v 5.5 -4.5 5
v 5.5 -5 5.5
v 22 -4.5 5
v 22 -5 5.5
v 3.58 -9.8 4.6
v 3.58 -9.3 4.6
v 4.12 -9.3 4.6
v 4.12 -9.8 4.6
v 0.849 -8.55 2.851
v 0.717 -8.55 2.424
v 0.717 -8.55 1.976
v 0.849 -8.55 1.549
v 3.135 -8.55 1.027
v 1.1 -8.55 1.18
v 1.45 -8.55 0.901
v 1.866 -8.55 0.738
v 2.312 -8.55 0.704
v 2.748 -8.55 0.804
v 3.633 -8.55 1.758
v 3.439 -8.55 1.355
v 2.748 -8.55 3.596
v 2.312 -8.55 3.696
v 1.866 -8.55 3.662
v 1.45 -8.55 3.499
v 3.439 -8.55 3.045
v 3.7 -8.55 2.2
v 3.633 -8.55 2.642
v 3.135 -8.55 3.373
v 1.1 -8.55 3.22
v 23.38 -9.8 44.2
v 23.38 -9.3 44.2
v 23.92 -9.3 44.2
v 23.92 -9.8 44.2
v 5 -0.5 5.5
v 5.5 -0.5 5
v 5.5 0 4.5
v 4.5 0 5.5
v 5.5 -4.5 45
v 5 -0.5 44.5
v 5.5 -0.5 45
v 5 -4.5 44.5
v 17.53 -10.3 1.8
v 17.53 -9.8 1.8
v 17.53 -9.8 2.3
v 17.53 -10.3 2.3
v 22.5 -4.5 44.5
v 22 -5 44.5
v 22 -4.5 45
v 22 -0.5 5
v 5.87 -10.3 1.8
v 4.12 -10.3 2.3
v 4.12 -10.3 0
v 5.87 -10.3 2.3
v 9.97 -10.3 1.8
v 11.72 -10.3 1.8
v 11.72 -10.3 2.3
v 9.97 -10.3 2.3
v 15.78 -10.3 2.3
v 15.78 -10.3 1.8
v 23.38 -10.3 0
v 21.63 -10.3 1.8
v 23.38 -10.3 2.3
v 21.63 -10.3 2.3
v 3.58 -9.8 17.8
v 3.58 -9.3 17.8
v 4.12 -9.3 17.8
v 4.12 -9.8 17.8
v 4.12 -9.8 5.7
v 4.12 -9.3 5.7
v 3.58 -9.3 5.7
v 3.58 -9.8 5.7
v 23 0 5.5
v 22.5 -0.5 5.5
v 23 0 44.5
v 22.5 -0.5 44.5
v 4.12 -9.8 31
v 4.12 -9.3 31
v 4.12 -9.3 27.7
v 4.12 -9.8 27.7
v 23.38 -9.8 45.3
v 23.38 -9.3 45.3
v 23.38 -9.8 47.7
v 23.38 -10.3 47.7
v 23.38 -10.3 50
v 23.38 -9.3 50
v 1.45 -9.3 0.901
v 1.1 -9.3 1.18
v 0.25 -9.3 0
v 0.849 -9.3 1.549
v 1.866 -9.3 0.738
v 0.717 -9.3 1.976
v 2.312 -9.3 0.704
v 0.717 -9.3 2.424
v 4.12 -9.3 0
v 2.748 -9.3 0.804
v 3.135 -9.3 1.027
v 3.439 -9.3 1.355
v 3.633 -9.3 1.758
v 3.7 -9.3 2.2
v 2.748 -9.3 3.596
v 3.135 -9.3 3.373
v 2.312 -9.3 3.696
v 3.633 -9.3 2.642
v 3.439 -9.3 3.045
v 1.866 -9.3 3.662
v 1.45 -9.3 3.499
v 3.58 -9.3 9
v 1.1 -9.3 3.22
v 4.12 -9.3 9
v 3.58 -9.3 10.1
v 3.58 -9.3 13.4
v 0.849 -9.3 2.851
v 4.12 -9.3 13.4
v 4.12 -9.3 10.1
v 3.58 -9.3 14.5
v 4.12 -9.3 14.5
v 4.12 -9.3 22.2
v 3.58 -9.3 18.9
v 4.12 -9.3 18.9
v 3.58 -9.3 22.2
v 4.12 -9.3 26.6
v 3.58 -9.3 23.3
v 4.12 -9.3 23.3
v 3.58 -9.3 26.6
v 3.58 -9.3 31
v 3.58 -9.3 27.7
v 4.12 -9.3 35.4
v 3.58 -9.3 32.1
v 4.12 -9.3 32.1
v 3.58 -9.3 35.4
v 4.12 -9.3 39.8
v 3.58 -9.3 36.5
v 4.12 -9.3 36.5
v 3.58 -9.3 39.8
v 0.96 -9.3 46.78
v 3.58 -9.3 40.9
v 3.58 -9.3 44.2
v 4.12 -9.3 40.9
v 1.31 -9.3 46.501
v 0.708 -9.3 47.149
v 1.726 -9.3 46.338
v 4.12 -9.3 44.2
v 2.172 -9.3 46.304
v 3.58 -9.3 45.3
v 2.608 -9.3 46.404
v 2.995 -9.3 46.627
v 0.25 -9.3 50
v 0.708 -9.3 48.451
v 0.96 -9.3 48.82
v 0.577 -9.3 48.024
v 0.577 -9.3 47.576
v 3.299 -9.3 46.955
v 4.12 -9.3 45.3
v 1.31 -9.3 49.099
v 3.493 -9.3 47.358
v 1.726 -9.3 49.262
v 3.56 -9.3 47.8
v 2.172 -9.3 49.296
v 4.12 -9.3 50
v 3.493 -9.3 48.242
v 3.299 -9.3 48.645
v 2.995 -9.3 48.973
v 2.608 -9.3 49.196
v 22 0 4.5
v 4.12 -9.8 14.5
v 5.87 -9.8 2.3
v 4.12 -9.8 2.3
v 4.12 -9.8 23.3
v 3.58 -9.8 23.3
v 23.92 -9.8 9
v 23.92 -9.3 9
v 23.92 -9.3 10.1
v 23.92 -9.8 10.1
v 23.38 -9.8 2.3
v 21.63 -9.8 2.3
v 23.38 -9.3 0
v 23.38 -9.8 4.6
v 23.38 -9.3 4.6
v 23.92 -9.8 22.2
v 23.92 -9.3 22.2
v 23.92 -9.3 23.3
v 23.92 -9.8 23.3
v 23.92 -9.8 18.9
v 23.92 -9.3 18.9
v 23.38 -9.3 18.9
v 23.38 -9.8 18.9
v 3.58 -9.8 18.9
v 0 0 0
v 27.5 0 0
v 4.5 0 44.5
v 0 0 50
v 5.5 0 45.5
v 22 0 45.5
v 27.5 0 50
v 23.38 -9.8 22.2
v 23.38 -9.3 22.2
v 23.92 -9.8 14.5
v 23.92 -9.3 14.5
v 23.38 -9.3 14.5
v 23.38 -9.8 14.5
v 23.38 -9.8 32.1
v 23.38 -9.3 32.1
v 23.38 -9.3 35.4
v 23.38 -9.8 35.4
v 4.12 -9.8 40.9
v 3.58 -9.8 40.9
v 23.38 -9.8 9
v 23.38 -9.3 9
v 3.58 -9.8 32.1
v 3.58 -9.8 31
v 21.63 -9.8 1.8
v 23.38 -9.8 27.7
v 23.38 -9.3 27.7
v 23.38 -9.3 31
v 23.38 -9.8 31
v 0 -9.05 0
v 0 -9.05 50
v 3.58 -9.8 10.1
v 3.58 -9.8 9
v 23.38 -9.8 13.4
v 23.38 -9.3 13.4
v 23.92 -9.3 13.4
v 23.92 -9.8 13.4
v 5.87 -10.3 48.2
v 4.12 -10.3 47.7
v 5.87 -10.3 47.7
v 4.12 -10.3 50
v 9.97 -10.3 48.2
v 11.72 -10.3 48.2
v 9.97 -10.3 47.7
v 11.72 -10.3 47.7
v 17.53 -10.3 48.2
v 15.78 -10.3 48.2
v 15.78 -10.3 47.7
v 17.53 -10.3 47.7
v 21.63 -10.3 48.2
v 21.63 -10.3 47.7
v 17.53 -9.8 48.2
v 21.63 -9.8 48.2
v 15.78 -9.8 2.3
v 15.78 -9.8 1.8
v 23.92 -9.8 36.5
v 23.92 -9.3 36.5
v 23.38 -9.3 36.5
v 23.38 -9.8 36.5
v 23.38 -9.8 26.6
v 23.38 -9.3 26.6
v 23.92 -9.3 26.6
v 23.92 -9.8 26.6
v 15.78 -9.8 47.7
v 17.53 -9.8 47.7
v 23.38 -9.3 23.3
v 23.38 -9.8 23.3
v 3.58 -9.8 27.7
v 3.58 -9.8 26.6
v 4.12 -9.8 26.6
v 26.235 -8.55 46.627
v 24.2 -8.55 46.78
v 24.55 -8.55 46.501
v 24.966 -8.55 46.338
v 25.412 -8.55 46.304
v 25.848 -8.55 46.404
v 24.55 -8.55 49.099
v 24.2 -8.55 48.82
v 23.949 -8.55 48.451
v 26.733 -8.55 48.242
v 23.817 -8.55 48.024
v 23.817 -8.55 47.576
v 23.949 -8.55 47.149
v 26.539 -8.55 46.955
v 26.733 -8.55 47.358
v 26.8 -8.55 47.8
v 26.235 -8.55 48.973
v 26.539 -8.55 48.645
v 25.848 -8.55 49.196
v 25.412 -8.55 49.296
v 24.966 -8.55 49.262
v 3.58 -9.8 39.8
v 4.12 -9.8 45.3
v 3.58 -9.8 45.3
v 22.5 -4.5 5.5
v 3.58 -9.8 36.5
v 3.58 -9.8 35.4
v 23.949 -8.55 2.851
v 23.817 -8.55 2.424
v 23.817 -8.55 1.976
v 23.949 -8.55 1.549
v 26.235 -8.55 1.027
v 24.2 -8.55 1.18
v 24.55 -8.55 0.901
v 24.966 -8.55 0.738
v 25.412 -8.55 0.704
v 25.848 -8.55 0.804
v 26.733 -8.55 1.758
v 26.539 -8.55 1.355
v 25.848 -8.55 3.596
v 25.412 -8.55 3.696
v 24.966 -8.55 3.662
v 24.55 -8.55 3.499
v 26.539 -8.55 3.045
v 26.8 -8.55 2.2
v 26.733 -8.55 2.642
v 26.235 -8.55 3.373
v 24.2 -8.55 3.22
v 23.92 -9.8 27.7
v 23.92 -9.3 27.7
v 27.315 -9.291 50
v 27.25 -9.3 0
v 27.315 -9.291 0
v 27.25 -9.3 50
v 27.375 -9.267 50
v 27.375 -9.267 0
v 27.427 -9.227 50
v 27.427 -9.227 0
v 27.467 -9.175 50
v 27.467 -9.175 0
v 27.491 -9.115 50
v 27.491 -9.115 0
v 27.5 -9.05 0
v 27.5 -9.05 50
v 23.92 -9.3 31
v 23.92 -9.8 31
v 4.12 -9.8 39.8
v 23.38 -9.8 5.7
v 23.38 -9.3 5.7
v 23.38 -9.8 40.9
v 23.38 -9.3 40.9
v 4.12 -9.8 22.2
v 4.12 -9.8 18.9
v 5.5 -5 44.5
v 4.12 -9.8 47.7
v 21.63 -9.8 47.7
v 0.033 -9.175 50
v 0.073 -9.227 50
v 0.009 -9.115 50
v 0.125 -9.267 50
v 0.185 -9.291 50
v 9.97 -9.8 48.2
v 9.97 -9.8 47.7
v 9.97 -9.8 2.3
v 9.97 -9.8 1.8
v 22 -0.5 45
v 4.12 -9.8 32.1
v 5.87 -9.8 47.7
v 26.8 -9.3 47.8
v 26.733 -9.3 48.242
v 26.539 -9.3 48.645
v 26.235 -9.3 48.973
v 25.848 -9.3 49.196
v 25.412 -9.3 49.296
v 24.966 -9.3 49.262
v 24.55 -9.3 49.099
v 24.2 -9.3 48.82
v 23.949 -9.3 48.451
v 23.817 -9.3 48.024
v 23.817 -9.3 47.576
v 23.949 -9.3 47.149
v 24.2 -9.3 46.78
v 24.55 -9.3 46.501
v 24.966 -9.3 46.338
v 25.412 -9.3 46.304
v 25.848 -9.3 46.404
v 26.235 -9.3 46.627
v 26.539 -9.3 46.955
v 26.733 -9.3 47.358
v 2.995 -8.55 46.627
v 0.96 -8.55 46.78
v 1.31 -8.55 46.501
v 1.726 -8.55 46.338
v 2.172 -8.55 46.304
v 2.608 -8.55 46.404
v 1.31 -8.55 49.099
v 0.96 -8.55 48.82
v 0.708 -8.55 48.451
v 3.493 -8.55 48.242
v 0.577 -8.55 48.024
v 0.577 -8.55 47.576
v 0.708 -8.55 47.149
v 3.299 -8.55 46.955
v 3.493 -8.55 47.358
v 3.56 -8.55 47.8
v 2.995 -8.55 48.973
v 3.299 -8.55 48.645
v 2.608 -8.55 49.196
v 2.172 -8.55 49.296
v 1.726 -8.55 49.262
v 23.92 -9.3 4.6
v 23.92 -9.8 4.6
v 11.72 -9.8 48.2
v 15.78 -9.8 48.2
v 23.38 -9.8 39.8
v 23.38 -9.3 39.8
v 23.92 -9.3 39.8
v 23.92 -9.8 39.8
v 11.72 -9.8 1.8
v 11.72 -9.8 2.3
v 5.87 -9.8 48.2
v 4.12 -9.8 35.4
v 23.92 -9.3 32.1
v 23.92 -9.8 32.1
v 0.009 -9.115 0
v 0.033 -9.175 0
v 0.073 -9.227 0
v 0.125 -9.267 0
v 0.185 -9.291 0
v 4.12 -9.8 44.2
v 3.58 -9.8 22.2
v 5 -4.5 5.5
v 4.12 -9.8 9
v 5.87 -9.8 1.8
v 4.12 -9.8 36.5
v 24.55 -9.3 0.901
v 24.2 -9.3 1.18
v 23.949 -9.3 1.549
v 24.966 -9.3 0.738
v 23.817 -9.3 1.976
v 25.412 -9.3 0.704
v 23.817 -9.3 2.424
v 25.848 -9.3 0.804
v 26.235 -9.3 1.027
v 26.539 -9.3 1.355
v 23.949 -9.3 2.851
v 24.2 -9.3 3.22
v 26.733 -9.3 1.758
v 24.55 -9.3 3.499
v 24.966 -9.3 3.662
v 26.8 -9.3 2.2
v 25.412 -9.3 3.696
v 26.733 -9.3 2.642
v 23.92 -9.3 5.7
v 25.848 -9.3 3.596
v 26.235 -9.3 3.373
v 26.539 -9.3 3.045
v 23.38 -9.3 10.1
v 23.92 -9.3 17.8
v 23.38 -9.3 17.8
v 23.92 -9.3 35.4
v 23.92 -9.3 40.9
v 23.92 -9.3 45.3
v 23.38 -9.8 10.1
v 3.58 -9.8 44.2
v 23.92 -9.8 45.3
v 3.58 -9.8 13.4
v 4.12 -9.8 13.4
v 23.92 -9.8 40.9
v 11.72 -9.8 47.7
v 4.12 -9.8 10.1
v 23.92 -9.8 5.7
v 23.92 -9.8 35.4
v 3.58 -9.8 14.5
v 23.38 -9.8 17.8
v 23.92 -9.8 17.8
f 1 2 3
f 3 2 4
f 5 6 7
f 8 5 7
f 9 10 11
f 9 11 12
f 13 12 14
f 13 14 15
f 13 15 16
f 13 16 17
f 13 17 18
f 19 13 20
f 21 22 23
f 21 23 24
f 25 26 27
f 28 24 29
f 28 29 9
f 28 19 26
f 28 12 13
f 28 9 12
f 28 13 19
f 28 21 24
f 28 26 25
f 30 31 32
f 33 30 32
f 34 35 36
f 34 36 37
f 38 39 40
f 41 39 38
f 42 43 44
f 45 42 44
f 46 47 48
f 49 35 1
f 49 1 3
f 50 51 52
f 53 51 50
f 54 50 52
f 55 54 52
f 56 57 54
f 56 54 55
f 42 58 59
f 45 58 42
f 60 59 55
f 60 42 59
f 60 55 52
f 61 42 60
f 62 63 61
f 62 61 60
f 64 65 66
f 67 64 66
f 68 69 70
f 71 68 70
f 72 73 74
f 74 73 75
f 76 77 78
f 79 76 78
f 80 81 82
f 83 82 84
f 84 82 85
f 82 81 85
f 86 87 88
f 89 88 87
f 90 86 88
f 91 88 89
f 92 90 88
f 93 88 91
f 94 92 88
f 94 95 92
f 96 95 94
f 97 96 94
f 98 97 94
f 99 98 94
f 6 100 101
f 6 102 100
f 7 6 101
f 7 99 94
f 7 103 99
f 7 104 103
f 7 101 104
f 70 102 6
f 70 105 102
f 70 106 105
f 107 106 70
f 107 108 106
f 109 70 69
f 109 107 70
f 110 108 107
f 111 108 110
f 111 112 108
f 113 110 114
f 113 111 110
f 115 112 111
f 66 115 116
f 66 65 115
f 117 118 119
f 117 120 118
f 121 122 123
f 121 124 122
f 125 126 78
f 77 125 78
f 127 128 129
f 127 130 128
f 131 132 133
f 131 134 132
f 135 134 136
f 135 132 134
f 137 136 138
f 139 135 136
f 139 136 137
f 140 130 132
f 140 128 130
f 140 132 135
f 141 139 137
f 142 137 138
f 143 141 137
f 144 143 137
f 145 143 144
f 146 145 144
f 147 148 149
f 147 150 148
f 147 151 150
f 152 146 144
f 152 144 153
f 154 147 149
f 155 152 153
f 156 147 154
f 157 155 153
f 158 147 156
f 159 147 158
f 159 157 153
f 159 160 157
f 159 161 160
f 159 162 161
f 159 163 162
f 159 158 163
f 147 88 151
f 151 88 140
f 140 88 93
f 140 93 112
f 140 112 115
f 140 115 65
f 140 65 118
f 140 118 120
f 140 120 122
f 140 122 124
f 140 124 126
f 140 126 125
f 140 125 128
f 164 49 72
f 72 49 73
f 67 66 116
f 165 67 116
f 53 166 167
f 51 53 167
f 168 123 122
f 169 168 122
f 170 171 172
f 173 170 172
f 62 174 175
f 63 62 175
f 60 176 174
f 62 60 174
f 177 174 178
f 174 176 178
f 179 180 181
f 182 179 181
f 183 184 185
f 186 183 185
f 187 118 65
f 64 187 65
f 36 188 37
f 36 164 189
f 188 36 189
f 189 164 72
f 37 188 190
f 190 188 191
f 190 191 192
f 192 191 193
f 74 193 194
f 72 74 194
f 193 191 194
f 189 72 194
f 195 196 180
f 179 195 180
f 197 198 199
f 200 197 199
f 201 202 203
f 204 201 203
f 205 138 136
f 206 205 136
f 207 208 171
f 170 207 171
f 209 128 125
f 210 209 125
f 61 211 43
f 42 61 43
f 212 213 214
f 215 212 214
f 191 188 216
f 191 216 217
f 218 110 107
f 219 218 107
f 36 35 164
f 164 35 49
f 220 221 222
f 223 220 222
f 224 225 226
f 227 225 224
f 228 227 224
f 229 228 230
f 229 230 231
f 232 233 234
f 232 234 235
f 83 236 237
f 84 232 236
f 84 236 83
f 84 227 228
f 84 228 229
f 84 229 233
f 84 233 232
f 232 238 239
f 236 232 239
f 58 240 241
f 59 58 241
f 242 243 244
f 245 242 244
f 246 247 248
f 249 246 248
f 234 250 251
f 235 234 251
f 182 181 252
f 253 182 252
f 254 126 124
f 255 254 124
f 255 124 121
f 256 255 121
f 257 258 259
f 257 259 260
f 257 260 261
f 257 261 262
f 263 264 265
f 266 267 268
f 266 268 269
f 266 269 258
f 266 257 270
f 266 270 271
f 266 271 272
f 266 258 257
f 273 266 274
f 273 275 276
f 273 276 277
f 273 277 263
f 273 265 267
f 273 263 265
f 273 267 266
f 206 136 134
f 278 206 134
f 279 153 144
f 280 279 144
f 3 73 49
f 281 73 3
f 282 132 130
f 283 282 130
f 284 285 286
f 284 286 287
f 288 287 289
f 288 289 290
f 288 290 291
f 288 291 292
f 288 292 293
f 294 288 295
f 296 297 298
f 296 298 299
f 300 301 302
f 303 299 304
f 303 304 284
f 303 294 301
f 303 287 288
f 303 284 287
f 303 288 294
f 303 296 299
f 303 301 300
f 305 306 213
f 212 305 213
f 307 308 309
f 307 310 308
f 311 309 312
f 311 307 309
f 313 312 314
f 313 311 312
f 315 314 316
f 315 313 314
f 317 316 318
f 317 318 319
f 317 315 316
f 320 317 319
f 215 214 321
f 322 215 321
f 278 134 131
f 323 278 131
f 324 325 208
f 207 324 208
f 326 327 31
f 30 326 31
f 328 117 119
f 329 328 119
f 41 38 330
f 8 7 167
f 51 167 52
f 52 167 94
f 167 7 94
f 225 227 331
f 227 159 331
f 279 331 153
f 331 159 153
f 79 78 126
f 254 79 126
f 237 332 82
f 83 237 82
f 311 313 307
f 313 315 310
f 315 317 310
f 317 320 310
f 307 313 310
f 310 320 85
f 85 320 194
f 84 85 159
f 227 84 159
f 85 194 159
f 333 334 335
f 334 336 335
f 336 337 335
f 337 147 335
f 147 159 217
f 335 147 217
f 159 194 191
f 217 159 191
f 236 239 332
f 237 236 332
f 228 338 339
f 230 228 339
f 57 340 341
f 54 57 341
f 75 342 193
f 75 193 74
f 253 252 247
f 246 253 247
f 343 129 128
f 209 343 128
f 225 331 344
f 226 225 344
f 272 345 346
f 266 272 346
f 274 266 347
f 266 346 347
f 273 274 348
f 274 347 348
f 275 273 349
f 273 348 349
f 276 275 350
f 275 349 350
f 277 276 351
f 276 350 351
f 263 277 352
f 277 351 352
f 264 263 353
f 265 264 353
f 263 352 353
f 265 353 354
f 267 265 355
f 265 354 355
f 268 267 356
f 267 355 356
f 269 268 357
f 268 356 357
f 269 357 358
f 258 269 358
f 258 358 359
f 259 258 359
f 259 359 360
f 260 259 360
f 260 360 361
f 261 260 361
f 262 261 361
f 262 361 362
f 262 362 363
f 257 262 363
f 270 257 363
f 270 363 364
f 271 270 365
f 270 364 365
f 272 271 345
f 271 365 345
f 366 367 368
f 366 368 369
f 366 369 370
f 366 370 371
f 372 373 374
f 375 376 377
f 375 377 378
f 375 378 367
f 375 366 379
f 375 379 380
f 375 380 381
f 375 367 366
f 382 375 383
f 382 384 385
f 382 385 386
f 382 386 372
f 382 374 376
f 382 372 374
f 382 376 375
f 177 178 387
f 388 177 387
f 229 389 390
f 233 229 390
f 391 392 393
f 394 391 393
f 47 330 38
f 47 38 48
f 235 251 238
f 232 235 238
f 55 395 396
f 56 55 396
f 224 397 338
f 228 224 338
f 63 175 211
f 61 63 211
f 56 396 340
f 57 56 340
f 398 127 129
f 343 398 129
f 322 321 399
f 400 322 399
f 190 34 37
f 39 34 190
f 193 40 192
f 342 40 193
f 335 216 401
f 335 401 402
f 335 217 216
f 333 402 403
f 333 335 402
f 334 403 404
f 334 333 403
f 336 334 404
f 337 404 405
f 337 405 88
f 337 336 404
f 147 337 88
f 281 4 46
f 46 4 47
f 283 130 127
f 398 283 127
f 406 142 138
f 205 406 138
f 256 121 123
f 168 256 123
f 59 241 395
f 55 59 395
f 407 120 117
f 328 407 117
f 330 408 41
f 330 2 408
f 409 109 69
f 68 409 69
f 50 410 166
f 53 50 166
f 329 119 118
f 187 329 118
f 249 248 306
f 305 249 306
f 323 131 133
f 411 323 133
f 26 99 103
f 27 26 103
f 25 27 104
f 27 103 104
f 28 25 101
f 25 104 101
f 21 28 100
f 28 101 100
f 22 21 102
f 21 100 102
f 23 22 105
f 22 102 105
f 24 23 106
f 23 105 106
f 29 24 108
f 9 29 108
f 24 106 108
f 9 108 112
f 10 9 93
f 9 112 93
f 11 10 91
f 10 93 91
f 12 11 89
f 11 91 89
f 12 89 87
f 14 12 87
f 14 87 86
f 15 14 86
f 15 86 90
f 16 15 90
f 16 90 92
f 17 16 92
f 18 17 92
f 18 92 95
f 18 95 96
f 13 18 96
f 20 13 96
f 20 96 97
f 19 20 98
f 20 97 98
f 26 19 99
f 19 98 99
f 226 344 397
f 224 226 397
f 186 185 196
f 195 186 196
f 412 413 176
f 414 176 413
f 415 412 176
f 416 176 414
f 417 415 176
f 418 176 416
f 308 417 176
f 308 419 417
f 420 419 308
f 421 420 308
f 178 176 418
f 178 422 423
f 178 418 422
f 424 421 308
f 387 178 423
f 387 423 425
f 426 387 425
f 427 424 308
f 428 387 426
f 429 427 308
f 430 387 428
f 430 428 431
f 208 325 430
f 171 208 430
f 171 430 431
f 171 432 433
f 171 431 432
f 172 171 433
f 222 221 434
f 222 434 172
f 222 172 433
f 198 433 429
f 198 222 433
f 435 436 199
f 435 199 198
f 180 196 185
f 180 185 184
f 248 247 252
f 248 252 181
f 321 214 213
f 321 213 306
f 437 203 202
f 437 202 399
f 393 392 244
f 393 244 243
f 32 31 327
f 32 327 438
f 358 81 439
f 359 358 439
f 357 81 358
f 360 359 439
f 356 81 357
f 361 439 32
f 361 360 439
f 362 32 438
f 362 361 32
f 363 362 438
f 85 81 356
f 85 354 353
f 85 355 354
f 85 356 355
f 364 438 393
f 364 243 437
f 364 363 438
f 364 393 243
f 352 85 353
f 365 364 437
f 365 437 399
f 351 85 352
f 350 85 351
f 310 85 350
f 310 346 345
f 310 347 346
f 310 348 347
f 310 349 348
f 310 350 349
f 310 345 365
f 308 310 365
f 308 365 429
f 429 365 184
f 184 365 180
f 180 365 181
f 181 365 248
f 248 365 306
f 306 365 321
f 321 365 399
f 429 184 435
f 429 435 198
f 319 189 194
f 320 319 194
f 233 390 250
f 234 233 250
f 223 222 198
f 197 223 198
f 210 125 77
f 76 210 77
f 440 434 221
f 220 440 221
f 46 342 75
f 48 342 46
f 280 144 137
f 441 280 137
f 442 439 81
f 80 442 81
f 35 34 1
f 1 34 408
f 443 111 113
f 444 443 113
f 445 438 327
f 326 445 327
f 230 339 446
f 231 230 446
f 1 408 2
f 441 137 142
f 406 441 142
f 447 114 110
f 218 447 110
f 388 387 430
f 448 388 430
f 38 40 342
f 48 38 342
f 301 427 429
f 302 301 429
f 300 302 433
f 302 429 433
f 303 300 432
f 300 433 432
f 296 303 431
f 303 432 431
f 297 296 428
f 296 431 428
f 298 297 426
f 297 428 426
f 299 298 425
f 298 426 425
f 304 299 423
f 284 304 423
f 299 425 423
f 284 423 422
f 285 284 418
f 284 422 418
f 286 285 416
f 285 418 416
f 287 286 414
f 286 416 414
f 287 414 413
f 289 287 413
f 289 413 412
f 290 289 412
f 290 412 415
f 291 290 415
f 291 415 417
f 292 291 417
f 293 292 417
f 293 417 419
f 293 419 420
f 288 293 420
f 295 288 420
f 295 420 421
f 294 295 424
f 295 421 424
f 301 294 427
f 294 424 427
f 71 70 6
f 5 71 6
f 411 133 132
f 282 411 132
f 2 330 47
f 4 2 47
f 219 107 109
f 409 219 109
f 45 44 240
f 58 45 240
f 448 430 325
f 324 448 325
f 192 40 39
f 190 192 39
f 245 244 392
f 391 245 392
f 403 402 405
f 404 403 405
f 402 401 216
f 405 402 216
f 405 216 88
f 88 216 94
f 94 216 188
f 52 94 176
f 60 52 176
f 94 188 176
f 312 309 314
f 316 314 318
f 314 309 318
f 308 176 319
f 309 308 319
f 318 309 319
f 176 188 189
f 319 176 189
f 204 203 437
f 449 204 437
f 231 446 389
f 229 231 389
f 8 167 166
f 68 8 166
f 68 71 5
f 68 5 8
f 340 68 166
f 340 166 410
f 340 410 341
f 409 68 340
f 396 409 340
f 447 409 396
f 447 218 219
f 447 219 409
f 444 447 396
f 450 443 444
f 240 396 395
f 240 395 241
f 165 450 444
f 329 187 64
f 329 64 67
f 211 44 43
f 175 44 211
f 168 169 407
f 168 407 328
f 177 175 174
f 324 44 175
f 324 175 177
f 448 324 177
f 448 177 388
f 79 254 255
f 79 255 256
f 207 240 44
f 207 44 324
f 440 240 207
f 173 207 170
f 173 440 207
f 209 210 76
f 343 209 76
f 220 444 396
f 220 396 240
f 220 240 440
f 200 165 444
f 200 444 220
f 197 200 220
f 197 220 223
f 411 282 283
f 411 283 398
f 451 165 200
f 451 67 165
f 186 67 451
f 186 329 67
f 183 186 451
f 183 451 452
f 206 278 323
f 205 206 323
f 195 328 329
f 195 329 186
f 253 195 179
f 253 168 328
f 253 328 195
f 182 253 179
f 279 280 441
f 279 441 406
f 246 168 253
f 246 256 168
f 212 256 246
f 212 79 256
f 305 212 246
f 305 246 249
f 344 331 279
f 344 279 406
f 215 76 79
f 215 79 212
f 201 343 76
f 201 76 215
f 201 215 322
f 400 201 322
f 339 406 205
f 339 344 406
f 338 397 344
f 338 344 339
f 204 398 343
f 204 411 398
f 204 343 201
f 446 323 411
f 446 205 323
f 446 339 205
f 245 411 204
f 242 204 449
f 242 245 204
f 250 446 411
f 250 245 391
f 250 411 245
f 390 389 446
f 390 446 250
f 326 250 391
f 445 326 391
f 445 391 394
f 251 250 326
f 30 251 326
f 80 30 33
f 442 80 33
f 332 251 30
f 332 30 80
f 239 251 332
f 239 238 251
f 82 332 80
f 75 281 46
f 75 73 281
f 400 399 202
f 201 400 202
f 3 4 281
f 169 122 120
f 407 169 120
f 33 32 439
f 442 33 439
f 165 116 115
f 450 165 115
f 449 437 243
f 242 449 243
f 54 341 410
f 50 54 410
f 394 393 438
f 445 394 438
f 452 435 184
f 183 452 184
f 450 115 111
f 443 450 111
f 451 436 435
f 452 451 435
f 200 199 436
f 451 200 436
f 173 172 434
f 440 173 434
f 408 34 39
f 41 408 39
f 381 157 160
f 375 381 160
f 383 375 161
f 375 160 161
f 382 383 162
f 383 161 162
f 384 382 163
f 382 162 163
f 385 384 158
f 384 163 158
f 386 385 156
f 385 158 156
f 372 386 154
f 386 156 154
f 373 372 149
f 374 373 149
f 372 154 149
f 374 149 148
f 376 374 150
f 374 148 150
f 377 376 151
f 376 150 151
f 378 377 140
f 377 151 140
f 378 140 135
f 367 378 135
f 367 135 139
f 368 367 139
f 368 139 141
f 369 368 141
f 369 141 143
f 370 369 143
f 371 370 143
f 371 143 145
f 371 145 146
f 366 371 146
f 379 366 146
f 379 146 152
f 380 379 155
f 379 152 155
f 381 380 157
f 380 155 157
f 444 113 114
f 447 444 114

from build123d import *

# Parameters (mm, degrees)
F0_W      = 27.5
F0_H      = 50
F1_DEPTH  = 9.3
F3_DEPTH  = 0.5
F4_R      = 1.5
F5_DEPTH  = 0.75
F6_R      = 0.25
F8_DEPTH  = 0.5
F9_W      = 17.5
F9_H      = 40
F10_DEPTH = 5
F11_SIZE  = 0.5


with BuildPart() as f1:
    # F0 (on Front) → F1 (new body)
    with BuildSketch(Plane.XZ):
        with Locations((13.75, 25)):
            Rectangle(F0_W, F0_H)
    extrude(amount=F1_DEPTH)

    # F2 (on face) → F3 (join)
    with BuildSketch(Plane.XZ.offset(9.3)):
        Polygon((13.75, 50), (4.1195944277, 50), (4.1195944277, 45.3), (3.5795944277, 45.3), (3.5795944277, 44.2), (4.1195944277, 44.2), (4.1195944277, 40.9), (3.5795944277, 40.9), (3.5795944277, 39.8), (4.1195944277, 39.8), (4.1195944277, 36.5), (3.5795944277, 36.5), (3.5795944277, 35.4), (4.1195944277, 35.4), (4.1195944277, 32.1), (3.5795944277, 32.1), (3.5795944277, 31), (4.1195944277, 31), (4.1195944277, 27.7), (3.5795944277, 27.7), (3.5795944277, 26.6), (4.1195944277, 26.6), (4.1195944277, 23.3), (3.5795944277, 23.3), (3.5795944277, 22.2), (4.1195944277, 22.2), (4.1195944277, 18.9), (3.5795944277, 18.9), (3.5795944277, 17.8), (4.1195944277, 17.8), (4.1195944277, 14.5), (3.5795944277, 14.5), (3.5795944277, 13.4), (4.1195944277, 13.4), (4.1195944277, 10.1), (3.5795944277, 10.1), (3.5795944277, 9), (4.1195944277, 9), (4.1195944277, 5.7), (3.5795944277, 5.7), (3.5795944277, 4.6), (4.1195944277, 4.6), (4.1195944277, 0), (13.75, 0), (23.3804055723, 0), (23.3804055723, 4.6), (23.9204055723, 4.6), (23.9204055723, 5.7), (23.3804055723, 5.7), (23.3804055723, 9), (23.9204055723, 9), (23.9204055723, 10.1), (23.3804055723, 10.1), (23.3804055723, 13.4), (23.9204055723, 13.4), (23.9204055723, 14.5), (23.3804055723, 14.5), (23.3804055723, 17.8), (23.9204055723, 17.8), (23.9204055723, 18.9), (23.3804055723, 18.9), (23.3804055723, 22.2), (23.9204055723, 22.2), (23.9204055723, 23.3), (23.3804055723, 23.3), (23.3804055723, 26.6), (23.9204055723, 26.6), (23.9204055723, 27.7), (23.3804055723, 27.7), (23.3804055723, 31), (23.9204055723, 31), (23.9204055723, 32.1), (23.3804055723, 32.1), (23.3804055723, 35.4), (23.9204055723, 35.4), (23.9204055723, 36.5), (23.3804055723, 36.5), (23.3804055723, 39.8), (23.9204055723, 39.8), (23.9204055723, 40.9), (23.3804055723, 40.9), (23.3804055723, 44.2), (23.9204055723, 44.2), (23.9204055723, 45.3), (23.3804055723, 45.3), (23.3804055723, 50), align=None)
    extrude(amount=F3_DEPTH)

    # F4 (on face) → F5 (cut)
    with BuildSketch(Plane.XZ.offset(9.3)):
        with Locations((2.2, 2.2)):
            Circle(F4_R)
        with Locations((25.3, 2.2)):
            Circle(F4_R)
        with Locations((2.0597972139, 47.8)):
            Circle(F4_R)
        with Locations((25.3, 47.8)):
            Circle(F4_R)
    extrude(amount=-F5_DEPTH, mode=Mode.SUBTRACT)

    # F6
    f6_edges = [f1.edges().sort_by_distance(p)[0] for p in [
        (0, -9.3, 25),
        (27.5, -9.3, 25),
    ]]
    fillet(f6_edges, radius=F6_R)

    # F7 (on face) → F8 (join)
    with BuildSketch(Plane.XZ.offset(9.8)):
        Polygon((23.3804055723, 50), (4.1195944277, 50), (4.1195944277, 48.2), (4.1195944277, 47.7), (5.8695944277, 47.7), (5.8695944277, 48.2), (9.9695944277, 48.2), (9.9695944277, 47.7), (11.7195944277, 47.7), (11.7195944277, 48.2), (15.7804055723, 48.2), (15.7804055723, 47.7), (17.5304055723, 47.7), (17.5304055723, 48.2), (21.6304055723, 48.2), (21.6304055723, 47.7), (23.3804055723, 47.7), (23.3804055723, 48.2), align=None)
        Polygon((23.3804055723, 2.3), (21.6304055723, 2.3), (21.6304055723, 1.8), (17.5304055723, 1.8), (17.5304055723, 2.3), (15.7804055723, 2.3), (15.7804055723, 1.8), (11.7195944277, 1.8), (11.7195944277, 2.3), (9.9695944277, 2.3), (9.9695944277, 1.8), (5.8695944277, 1.8), (5.8695944277, 2.3), (4.1195944277, 2.3), (4.1195944277, 1.8), (4.1195944277, 0), (23.3804055723, 0), (23.3804055723, 1.8), align=None)
    extrude(amount=F8_DEPTH)

    # F9 (on face) → F10 (cut)
    with BuildSketch(Plane.XZ):
        with Locations((13.75, 25)):
            Rectangle(F9_W, F9_H)
    extrude(amount=F10_DEPTH, mode=Mode.SUBTRACT)

    # F11
    f11_edges = [f1.edges().sort_by_distance(p)[0] for p in [
        (5, -2.5, 45),
        (13.75, -5, 45),
        (5, -5, 25),
        (22.5, -5, 25),
        (5, -2.5, 5),
        (13.75, -5, 5),
        (22.5, -2.5, 5),
        (13.75, 0, 5),
        (22.5, -2.5, 45),
        (13.75, 0, 45),
        (5, 0, 25),
        (22.5, 0, 25),
    ]]
    chamfer(f11_edges, length=F11_SIZE)


solid = f1.part
